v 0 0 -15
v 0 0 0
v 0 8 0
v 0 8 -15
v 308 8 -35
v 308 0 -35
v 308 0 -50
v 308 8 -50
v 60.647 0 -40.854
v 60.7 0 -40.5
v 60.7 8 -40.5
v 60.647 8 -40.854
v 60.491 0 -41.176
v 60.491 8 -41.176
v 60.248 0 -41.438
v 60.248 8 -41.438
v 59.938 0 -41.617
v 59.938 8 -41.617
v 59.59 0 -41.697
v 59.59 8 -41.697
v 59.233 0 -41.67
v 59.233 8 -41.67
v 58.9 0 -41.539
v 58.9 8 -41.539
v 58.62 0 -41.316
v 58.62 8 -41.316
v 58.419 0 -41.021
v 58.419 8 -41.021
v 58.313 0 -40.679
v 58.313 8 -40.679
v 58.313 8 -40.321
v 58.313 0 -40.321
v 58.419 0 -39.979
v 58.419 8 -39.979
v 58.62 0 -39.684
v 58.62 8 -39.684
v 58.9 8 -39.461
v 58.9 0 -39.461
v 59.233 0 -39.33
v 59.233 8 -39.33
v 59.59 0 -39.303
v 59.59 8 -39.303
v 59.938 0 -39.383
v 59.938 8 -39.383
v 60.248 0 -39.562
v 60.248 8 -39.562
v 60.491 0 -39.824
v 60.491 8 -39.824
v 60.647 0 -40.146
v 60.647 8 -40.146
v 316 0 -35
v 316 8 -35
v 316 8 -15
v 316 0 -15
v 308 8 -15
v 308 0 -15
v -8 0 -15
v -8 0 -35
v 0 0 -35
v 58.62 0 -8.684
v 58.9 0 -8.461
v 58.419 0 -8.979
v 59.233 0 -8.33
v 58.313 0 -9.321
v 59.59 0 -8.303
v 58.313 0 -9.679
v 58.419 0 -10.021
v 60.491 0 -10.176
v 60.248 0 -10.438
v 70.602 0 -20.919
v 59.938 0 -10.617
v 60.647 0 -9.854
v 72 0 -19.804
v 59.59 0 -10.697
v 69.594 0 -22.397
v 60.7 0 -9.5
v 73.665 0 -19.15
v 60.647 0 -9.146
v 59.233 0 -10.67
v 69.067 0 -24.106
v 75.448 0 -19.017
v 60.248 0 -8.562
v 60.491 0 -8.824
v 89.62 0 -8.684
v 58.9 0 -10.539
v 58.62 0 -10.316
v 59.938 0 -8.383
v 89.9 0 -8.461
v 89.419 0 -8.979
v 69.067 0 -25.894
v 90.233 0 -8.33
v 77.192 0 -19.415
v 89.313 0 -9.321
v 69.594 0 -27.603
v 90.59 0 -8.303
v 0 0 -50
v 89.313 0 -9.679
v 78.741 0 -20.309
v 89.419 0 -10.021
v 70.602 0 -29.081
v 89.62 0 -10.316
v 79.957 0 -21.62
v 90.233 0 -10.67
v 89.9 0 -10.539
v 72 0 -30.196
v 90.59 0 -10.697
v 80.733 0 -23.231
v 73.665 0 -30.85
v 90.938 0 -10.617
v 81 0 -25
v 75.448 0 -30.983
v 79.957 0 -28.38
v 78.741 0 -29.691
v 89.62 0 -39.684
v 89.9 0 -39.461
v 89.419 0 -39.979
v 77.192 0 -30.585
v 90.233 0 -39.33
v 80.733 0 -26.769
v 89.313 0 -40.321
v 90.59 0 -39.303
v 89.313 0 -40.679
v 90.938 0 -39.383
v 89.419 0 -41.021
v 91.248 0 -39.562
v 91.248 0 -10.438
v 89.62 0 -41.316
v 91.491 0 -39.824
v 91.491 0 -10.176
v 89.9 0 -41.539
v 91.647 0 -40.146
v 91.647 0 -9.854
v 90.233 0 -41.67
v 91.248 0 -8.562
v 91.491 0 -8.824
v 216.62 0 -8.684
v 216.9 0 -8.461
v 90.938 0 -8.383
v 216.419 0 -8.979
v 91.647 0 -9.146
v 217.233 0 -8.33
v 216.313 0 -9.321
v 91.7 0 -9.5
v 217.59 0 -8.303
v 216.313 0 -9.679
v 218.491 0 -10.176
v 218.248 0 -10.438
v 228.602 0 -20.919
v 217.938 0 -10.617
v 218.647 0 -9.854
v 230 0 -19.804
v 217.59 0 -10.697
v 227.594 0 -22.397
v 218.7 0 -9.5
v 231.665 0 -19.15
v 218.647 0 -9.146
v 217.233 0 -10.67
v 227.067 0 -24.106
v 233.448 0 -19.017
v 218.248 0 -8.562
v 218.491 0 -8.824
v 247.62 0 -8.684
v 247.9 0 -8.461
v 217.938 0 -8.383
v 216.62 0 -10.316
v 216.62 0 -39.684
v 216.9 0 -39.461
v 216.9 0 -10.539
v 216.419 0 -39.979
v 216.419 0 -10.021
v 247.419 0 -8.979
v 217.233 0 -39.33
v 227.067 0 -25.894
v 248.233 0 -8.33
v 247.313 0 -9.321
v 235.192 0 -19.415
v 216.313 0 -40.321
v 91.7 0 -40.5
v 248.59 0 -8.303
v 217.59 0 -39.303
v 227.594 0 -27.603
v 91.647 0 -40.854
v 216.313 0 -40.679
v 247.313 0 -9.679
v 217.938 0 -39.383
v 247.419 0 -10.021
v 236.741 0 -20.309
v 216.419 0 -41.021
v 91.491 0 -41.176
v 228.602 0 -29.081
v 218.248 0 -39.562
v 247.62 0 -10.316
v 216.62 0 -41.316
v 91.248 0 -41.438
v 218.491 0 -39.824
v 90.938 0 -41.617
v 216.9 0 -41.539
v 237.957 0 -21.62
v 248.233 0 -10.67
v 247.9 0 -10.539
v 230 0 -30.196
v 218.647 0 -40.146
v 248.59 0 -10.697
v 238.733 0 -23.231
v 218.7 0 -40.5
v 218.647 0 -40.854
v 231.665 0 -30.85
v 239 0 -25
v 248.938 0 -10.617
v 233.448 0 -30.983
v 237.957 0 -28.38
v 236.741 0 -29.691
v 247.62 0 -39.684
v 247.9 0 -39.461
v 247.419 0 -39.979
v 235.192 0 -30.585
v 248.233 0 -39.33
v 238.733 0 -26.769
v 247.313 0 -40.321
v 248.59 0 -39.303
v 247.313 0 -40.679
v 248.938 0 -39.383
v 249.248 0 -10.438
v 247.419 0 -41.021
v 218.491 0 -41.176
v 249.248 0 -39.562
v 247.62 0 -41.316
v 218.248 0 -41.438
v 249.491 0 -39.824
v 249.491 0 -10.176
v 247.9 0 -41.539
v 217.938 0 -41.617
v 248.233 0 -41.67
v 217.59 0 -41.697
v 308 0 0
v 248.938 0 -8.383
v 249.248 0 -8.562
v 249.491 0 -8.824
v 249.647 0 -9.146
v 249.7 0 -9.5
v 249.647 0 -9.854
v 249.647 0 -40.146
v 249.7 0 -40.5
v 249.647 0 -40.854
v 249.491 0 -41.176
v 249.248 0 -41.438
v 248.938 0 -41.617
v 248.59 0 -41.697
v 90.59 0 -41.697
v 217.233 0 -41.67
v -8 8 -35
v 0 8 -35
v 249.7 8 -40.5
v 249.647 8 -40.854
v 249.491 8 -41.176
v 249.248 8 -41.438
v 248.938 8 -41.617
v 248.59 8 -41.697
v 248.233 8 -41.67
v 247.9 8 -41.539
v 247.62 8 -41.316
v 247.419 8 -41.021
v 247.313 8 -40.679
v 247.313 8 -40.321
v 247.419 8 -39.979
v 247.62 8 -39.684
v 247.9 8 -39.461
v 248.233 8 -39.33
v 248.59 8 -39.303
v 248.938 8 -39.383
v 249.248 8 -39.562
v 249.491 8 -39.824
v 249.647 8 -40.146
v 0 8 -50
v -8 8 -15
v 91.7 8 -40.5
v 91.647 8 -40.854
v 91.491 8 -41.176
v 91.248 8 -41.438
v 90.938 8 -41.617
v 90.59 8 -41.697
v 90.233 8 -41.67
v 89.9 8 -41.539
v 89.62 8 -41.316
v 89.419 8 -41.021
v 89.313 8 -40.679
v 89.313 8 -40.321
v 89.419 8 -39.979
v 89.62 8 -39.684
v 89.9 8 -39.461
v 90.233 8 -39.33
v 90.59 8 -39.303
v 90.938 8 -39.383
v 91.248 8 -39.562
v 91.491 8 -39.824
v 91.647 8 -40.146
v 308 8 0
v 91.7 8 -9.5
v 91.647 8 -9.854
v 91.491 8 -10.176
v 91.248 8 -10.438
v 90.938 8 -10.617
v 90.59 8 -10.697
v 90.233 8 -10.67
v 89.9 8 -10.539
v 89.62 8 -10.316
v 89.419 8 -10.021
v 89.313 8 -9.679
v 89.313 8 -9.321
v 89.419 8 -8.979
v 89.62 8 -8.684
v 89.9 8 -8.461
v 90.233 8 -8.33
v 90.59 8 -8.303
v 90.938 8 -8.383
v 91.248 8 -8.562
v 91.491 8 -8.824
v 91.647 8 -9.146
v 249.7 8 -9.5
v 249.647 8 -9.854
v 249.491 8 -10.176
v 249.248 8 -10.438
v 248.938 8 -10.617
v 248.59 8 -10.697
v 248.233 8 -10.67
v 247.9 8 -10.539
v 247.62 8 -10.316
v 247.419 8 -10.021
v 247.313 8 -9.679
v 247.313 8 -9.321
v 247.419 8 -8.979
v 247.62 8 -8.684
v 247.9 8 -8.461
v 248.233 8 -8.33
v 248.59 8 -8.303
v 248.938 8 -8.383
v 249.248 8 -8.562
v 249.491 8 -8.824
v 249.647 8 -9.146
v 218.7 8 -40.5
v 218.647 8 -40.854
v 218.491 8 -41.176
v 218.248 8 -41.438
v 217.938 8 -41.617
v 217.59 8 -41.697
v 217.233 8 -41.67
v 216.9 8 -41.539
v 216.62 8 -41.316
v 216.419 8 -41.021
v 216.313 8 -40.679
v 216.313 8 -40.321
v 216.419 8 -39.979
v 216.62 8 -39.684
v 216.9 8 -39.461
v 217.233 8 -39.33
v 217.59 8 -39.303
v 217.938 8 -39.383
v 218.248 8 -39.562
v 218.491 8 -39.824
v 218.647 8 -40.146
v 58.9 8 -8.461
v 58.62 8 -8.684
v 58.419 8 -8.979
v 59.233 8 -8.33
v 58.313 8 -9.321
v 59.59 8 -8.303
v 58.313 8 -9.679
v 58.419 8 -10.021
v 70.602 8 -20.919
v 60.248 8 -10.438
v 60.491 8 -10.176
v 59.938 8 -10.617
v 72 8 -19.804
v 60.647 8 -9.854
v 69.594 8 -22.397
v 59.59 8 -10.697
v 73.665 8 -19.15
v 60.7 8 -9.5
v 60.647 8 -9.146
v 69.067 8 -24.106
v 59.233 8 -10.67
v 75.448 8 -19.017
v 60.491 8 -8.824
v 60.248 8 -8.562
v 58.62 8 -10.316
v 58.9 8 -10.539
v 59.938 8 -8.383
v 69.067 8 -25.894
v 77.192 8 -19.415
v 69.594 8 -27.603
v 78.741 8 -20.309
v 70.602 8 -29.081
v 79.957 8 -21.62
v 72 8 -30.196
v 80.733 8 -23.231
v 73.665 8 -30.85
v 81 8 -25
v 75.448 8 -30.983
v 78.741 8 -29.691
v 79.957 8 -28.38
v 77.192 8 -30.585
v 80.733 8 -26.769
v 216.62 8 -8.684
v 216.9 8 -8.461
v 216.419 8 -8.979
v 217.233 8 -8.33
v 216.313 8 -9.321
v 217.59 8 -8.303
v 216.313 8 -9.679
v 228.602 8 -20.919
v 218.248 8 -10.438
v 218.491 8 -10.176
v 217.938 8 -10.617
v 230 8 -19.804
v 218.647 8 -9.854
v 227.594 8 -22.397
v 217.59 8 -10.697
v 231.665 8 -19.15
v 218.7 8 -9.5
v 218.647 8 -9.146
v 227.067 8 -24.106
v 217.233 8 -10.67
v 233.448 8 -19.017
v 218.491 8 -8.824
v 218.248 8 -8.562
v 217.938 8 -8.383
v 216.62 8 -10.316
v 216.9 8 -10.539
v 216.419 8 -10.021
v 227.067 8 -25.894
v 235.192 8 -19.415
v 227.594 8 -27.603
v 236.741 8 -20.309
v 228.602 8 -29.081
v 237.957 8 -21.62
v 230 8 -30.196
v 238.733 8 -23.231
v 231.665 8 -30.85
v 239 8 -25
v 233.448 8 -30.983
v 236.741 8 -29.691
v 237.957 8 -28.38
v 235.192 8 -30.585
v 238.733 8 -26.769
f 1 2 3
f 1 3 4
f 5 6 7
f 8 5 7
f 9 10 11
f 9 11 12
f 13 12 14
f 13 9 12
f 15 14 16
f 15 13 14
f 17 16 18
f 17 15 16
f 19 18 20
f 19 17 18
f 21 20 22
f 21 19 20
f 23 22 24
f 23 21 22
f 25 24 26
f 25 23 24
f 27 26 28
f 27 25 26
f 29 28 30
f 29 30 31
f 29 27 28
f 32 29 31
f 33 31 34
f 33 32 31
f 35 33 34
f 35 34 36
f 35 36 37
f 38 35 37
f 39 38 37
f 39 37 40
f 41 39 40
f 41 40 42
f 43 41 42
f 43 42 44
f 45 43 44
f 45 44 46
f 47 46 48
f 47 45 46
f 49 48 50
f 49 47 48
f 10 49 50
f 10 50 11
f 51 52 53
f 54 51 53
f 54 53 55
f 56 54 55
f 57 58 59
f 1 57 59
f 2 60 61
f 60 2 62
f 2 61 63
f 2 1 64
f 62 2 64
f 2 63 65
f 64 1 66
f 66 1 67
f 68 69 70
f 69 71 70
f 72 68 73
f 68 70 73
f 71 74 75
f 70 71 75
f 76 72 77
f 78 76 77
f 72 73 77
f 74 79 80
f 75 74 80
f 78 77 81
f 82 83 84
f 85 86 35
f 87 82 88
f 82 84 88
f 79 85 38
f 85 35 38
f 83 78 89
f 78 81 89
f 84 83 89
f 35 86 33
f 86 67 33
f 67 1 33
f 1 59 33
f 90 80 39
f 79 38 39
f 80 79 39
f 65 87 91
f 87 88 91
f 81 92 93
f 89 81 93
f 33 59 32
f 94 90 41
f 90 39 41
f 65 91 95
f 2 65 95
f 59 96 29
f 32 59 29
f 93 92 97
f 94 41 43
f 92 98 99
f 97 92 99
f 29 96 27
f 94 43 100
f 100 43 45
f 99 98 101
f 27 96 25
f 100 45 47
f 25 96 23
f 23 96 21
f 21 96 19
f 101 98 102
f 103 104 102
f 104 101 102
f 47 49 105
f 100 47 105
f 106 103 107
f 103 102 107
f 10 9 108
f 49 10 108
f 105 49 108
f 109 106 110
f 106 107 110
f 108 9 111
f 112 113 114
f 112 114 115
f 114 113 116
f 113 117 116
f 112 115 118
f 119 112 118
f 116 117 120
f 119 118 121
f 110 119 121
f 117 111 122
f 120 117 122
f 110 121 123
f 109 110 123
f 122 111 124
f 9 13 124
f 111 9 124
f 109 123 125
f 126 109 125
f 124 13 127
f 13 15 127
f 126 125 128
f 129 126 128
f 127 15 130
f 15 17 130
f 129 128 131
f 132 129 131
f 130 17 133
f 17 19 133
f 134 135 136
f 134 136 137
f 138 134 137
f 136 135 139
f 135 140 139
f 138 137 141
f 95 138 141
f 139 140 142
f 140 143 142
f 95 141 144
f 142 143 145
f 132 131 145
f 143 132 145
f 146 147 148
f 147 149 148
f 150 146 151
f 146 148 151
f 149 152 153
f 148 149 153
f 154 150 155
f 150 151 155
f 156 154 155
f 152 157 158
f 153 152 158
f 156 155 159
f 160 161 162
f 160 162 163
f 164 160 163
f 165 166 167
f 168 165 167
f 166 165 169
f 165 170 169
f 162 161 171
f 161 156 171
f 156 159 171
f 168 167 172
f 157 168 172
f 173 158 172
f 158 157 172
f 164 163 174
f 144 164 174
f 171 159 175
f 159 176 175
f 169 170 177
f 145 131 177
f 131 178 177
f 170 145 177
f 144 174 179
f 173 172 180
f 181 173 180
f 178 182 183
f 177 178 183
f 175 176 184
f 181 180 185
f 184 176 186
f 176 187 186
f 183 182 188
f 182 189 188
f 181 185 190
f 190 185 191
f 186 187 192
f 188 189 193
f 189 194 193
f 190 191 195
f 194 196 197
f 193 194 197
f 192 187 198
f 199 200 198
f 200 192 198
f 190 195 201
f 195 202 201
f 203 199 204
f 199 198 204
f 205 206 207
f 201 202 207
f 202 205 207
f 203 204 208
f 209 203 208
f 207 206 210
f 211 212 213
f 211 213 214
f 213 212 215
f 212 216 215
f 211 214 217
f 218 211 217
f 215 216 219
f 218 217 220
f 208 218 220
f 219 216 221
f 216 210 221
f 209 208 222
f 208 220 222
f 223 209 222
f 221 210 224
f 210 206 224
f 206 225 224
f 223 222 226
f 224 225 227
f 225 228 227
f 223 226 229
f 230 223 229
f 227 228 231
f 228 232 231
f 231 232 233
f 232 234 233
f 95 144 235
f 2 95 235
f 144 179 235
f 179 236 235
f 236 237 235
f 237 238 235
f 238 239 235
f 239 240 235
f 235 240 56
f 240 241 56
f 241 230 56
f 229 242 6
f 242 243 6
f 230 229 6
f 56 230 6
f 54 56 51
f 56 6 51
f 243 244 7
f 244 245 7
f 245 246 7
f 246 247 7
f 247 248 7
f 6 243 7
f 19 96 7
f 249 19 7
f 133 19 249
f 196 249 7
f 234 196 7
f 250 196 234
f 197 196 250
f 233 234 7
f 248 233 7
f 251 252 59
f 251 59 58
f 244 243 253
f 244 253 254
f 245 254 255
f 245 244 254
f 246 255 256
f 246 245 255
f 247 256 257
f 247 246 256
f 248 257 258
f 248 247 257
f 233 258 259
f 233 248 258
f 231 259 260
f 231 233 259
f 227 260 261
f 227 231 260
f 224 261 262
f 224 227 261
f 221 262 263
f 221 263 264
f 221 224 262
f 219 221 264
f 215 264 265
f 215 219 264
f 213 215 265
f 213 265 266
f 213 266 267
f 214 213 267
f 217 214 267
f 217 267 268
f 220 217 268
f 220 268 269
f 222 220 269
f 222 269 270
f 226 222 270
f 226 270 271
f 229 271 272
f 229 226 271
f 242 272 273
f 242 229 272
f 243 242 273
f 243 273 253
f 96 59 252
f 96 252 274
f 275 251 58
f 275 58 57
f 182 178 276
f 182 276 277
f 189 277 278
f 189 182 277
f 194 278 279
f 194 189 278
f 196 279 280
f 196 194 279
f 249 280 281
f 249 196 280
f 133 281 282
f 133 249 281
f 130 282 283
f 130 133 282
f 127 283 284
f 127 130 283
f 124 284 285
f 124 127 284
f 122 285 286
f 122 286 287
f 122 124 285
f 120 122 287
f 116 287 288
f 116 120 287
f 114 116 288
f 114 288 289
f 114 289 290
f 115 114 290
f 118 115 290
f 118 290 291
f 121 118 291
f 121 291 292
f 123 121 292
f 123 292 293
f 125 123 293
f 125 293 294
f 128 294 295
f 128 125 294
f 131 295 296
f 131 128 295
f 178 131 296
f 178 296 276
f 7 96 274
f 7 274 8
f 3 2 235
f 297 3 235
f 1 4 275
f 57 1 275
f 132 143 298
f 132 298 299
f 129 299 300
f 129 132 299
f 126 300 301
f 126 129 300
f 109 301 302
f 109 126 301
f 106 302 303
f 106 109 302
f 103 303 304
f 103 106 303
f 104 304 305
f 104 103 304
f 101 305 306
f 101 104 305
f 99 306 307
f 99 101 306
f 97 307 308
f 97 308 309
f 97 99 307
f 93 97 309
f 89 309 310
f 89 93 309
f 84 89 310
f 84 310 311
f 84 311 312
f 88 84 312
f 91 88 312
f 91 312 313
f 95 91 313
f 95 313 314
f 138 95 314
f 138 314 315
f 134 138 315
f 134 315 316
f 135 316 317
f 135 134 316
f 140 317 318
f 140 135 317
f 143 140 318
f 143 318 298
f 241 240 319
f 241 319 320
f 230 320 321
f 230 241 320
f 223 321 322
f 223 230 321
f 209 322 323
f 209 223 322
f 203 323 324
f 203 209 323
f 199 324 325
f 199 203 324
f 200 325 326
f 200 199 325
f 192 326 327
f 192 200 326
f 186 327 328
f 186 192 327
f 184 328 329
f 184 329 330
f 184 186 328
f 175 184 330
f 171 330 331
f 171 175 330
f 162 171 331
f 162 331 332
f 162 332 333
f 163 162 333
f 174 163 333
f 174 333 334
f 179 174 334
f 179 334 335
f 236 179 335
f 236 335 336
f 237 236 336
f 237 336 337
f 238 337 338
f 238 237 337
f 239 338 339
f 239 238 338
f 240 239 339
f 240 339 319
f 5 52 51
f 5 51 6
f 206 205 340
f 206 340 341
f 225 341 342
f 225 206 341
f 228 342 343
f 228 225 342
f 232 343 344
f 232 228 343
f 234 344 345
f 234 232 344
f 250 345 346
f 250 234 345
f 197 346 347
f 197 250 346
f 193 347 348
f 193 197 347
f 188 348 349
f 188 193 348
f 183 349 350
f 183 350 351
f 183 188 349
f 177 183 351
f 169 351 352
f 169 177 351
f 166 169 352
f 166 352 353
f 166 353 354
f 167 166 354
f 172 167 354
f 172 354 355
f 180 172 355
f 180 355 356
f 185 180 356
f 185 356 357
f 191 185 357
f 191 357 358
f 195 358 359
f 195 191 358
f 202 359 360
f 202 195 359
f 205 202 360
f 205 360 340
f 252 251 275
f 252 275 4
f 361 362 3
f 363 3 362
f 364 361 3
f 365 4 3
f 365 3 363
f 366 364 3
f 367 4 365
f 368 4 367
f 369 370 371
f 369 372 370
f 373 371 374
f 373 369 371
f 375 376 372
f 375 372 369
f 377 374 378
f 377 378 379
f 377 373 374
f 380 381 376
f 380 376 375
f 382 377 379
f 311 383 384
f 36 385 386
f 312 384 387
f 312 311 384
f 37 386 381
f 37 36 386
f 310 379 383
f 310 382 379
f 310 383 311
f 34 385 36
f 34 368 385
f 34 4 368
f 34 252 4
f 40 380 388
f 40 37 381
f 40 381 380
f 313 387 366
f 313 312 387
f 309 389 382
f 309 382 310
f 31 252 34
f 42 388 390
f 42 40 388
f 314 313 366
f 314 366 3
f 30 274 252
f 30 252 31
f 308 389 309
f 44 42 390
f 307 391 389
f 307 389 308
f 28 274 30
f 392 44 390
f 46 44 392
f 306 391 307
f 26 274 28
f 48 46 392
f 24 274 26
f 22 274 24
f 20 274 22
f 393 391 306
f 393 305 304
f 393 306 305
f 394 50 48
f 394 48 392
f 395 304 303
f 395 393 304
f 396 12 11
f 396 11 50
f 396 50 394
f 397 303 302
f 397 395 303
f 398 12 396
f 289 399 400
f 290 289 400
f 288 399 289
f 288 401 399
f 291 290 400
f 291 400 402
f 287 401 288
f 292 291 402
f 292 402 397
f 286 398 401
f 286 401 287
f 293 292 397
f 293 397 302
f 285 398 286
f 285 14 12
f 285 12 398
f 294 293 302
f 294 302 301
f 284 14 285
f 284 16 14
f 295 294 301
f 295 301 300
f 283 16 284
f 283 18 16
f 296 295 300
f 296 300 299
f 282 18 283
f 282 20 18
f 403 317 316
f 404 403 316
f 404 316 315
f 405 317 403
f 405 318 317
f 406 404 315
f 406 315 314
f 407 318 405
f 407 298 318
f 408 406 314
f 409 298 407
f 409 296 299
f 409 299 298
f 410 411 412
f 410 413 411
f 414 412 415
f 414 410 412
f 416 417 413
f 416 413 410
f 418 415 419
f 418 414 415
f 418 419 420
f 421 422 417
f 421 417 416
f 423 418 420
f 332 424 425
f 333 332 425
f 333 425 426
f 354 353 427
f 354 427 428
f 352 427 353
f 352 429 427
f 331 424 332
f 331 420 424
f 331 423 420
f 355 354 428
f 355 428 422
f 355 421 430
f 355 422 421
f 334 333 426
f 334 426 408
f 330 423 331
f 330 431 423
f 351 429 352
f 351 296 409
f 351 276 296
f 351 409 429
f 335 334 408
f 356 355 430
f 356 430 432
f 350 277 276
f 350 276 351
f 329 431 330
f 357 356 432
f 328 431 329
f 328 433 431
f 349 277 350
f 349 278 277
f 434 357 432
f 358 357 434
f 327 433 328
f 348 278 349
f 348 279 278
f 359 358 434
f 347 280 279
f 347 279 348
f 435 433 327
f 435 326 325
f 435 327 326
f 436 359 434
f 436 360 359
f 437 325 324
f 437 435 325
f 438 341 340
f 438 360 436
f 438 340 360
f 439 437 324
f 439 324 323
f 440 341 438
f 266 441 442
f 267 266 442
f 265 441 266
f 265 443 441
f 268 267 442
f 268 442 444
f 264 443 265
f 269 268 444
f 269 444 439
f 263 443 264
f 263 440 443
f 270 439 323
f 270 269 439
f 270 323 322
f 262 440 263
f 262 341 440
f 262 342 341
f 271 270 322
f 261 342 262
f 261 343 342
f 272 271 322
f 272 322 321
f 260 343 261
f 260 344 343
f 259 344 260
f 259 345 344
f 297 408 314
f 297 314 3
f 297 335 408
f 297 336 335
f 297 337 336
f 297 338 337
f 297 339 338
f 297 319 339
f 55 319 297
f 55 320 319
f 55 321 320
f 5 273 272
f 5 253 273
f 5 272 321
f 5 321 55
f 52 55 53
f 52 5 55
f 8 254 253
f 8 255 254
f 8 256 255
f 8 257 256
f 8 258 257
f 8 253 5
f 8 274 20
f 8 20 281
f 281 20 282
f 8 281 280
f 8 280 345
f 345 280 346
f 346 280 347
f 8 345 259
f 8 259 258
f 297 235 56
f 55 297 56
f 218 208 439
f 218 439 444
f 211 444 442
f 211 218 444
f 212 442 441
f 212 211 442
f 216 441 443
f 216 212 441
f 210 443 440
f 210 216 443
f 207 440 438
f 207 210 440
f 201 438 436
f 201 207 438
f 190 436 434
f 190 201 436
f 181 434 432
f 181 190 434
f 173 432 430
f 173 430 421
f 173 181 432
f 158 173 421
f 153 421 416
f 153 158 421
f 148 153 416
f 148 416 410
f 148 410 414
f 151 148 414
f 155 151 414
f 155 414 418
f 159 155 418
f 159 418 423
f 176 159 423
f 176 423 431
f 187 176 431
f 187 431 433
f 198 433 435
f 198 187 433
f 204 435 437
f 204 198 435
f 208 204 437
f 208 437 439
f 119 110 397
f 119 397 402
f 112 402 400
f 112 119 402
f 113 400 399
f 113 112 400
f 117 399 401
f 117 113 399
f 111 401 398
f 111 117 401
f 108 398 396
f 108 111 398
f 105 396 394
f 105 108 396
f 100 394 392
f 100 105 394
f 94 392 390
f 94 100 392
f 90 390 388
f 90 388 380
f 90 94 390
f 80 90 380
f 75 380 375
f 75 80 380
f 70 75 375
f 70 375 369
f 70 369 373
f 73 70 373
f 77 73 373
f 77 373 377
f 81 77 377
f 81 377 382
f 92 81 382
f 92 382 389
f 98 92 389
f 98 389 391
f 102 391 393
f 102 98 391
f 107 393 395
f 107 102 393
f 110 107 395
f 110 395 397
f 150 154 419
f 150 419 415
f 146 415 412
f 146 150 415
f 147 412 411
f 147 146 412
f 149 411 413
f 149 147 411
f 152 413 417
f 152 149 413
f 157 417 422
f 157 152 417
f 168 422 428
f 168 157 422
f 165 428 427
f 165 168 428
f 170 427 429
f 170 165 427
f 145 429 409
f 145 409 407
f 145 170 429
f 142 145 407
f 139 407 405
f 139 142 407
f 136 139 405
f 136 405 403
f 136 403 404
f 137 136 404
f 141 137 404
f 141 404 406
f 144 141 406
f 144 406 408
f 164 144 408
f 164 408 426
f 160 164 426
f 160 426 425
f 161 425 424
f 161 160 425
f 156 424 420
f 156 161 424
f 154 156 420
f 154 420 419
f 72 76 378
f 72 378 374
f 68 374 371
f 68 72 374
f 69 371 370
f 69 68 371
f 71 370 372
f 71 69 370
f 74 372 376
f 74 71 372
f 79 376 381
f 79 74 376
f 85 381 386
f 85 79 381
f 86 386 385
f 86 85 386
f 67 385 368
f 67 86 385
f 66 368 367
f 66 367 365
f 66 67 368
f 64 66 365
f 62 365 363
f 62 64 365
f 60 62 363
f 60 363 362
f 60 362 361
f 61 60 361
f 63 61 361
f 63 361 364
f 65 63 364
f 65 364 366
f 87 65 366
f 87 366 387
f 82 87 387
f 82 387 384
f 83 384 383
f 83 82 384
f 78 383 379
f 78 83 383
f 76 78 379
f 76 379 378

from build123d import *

# Parameters (mm, degrees)
SKETCH1_W           = 308
SKETCH1_H           = 50
SKETCH1_R           = 6
SKETCH1_R_2         = 1.2
BOSS_EXTRUDE1_DEPTH = 8
SKETCH2_W           = 8
SKETCH2_H           = 20
BOSS_EXTRUDE2_DEPTH = 8


with BuildPart() as part:
    # Sketch1 → Boss-Extrude1 (new body)
    with BuildSketch(Plane(origin=(0, 0, 0), x_dir=(1, 0, 0), z_dir=(0, 1, 0))):
        with Locations((154, 25)):
            Rectangle(SKETCH1_W, SKETCH1_H)
        with Locations((75, 25)):
            Circle(SKETCH1_R, mode=Mode.SUBTRACT)
        with Locations((59.5, 40.5)):
            Circle(SKETCH1_R_2, mode=Mode.SUBTRACT)
        with Locations((90.5, 40.5)):
            Circle(SKETCH1_R_2, mode=Mode.SUBTRACT)
        with Locations((59.5, 9.5)):
            Circle(SKETCH1_R_2, mode=Mode.SUBTRACT)
        with Locations((90.5, 9.5)):
            Circle(SKETCH1_R_2, mode=Mode.SUBTRACT)
        with Locations((217.5, 9.5)):
            Circle(SKETCH1_R_2, mode=Mode.SUBTRACT)
        with Locations((248.5, 9.5)):
            Circle(SKETCH1_R_2, mode=Mode.SUBTRACT)
        with Locations((217.5, 40.5)):
            Circle(SKETCH1_R_2, mode=Mode.SUBTRACT)
        with Locations((233, 25)):
            Circle(SKETCH1_R, mode=Mode.SUBTRACT)
        with Locations((248.5, 40.5)):
            Circle(SKETCH1_R_2, mode=Mode.SUBTRACT)
    extrude(amount=BOSS_EXTRUDE1_DEPTH)

    # Sketch2 → Boss-Extrude2 (add)
    with BuildSketch(Plane(origin=(0, 8, 0), x_dir=(-1, 0, 0), z_dir=(0, 1, 0))):
        with Locations((4, -25)):
            Rectangle(SKETCH2_W, SKETCH2_H)
        with Locations((-312, -25)):
            Rectangle(SKETCH2_W, SKETCH2_H)
    extrude(amount=-BOSS_EXTRUDE2_DEPTH)


solid = part.part
